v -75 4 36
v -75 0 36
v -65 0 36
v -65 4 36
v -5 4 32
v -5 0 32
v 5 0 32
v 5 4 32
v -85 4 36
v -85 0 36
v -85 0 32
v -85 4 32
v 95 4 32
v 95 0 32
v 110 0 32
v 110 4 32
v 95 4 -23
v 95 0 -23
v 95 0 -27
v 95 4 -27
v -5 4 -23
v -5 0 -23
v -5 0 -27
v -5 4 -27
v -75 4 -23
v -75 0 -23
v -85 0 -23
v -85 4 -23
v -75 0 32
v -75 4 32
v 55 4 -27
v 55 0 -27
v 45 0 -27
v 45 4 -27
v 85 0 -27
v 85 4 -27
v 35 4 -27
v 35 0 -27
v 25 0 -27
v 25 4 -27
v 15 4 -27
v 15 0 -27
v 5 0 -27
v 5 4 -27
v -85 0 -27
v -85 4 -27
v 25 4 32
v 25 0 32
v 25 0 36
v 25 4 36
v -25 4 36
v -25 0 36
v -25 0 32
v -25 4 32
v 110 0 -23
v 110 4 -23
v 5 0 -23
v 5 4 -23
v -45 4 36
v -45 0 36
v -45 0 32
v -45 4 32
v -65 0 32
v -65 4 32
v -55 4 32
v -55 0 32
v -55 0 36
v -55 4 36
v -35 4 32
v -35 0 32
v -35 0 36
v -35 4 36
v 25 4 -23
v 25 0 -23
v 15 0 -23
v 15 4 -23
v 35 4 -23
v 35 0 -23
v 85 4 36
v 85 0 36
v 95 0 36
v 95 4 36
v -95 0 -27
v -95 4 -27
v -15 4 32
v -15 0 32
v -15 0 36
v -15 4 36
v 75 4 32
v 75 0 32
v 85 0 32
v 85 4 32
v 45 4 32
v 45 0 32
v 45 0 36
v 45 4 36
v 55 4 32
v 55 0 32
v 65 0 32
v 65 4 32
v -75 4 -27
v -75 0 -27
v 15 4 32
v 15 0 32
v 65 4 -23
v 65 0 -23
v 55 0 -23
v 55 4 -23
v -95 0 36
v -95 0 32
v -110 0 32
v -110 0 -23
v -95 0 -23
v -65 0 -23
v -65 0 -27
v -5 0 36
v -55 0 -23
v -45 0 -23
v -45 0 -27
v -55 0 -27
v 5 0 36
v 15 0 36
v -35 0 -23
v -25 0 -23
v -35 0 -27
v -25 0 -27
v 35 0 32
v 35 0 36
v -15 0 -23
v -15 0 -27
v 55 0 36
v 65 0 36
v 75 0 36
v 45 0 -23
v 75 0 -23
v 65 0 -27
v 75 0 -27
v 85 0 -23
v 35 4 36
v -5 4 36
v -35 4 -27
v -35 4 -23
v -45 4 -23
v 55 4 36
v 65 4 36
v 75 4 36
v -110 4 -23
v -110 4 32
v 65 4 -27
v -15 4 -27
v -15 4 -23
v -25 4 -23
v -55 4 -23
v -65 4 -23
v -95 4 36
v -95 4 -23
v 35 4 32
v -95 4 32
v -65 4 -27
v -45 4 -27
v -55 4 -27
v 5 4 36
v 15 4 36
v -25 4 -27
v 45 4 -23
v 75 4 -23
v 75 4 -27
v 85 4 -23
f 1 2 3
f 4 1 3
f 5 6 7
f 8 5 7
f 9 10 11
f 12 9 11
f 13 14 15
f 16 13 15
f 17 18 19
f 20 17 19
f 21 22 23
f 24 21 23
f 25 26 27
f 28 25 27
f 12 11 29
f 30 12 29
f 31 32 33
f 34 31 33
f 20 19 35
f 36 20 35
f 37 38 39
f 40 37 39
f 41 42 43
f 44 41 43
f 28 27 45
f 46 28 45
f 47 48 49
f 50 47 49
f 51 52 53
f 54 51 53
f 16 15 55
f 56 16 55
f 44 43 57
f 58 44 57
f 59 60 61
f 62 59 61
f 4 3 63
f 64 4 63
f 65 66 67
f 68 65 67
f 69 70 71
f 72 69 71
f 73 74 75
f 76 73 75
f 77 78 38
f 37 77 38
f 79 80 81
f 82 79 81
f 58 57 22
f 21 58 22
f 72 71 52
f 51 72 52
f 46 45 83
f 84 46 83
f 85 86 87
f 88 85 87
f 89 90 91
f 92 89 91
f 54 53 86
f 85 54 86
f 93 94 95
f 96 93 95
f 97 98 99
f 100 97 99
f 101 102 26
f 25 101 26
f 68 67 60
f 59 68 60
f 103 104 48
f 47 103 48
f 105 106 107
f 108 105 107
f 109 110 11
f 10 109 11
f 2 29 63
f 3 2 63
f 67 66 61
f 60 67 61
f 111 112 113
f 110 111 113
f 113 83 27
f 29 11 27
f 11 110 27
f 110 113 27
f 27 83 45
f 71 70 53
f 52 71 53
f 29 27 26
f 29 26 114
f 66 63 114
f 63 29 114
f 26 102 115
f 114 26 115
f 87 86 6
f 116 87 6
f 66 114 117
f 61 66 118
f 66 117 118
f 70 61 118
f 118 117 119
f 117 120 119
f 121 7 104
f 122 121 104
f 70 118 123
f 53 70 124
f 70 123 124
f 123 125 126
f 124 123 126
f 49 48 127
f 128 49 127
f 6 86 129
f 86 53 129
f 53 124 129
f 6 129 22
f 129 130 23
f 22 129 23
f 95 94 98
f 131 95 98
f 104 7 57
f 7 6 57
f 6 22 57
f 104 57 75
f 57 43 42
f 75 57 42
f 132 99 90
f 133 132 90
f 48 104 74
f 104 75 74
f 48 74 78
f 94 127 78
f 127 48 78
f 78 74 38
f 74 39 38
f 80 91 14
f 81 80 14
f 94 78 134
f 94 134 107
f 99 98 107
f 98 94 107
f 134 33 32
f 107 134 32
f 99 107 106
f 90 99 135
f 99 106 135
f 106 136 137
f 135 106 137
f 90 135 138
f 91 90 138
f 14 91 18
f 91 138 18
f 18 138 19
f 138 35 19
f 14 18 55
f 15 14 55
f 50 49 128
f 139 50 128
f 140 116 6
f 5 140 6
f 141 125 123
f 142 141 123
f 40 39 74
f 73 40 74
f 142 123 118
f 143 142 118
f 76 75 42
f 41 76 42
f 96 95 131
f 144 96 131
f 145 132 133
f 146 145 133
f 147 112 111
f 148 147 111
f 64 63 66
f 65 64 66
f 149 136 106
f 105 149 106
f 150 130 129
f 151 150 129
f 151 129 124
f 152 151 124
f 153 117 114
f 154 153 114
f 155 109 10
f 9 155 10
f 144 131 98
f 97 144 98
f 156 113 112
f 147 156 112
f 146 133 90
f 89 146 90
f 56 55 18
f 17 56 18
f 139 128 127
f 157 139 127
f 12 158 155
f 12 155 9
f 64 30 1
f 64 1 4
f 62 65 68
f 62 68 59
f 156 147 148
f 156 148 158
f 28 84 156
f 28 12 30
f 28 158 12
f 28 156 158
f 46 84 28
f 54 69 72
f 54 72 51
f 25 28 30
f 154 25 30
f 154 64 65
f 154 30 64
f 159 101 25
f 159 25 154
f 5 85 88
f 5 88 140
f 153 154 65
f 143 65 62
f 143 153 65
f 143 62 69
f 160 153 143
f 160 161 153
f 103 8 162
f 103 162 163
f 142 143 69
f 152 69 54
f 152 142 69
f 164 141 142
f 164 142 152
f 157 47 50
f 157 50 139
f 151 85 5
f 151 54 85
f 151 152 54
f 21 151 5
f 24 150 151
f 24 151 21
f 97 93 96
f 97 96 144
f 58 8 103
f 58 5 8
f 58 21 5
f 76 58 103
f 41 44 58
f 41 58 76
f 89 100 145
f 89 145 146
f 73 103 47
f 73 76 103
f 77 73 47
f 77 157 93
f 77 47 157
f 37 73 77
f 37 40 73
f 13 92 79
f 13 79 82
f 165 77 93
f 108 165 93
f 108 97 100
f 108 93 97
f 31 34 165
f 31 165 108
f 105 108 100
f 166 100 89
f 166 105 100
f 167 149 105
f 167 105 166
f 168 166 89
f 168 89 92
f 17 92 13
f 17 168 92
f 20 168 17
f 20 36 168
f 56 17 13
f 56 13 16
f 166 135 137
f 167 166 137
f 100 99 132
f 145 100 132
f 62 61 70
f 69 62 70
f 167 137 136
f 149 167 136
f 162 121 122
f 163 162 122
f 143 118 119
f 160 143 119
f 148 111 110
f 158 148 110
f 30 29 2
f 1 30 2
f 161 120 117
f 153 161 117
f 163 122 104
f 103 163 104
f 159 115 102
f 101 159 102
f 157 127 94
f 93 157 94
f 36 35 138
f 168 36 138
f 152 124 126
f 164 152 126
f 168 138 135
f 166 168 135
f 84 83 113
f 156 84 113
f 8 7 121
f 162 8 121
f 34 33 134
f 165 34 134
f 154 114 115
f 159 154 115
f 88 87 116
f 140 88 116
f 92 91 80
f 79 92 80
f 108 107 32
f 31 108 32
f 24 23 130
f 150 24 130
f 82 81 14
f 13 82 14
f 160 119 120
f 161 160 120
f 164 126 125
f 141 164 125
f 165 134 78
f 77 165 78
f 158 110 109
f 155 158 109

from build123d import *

# Parameters (mm, degrees)
EXTRUDE_2_DEPTH = 4


with BuildPart() as part:
    # Эскиз3 → Бобышка-Вытянуть2 (new body)
    with BuildSketch(Plane(origin=(0, 0, 0), x_dir=(1, 0, 0), z_dir=(0, 1, 0))):
        Polygon((110, -32), (110, 23), (95, 23), (95, 27), (85, 27), (85, 23), (75, 23), (75, 27), (65, 27), (65, 23), (55, 23), (55, 27), (45, 27), (45, 23), (35, 23), (35, 27), (25, 27), (25, 23), (15, 23), (15, 27), (5, 27), (5, 23), (-5, 23), (-5, 27), (-15, 27), (-15, 23), (-25, 23), (-25, 27), (-35, 27), (-35, 23), (-45, 23), (-45, 27), (-55, 27), (-55, 23), (-65, 23), (-65, 27), (-75, 27), (-75, 23), (-85, 23), (-85, 27), (-95, 27), (-95, 23), (-110, 23), (-110, -32), (-95, -32), (-95, -36), (-85, -36), (-85, -32), (-75, -32), (-75, -36), (-65, -36), (-65, -32), (-55, -32), (-55, -36), (-45, -36), (-45, -32), (-35, -32), (-35, -36), (-25, -36), (-25, -32), (-15, -32), (-15, -36), (-5, -36), (-5, -32), (5, -32), (5, -36), (15, -36), (15, -32), (25, -32), (25, -36), (35, -36), (35, -32), (45, -32), (45, -36), (55, -36), (55, -32), (65, -32), (65, -36), (75, -36), (75, -32), (85, -32), (85, -36), (95, -36), (95, -32), align=None)
    extrude(amount=EXTRUDE_2_DEPTH)


solid = part.part
